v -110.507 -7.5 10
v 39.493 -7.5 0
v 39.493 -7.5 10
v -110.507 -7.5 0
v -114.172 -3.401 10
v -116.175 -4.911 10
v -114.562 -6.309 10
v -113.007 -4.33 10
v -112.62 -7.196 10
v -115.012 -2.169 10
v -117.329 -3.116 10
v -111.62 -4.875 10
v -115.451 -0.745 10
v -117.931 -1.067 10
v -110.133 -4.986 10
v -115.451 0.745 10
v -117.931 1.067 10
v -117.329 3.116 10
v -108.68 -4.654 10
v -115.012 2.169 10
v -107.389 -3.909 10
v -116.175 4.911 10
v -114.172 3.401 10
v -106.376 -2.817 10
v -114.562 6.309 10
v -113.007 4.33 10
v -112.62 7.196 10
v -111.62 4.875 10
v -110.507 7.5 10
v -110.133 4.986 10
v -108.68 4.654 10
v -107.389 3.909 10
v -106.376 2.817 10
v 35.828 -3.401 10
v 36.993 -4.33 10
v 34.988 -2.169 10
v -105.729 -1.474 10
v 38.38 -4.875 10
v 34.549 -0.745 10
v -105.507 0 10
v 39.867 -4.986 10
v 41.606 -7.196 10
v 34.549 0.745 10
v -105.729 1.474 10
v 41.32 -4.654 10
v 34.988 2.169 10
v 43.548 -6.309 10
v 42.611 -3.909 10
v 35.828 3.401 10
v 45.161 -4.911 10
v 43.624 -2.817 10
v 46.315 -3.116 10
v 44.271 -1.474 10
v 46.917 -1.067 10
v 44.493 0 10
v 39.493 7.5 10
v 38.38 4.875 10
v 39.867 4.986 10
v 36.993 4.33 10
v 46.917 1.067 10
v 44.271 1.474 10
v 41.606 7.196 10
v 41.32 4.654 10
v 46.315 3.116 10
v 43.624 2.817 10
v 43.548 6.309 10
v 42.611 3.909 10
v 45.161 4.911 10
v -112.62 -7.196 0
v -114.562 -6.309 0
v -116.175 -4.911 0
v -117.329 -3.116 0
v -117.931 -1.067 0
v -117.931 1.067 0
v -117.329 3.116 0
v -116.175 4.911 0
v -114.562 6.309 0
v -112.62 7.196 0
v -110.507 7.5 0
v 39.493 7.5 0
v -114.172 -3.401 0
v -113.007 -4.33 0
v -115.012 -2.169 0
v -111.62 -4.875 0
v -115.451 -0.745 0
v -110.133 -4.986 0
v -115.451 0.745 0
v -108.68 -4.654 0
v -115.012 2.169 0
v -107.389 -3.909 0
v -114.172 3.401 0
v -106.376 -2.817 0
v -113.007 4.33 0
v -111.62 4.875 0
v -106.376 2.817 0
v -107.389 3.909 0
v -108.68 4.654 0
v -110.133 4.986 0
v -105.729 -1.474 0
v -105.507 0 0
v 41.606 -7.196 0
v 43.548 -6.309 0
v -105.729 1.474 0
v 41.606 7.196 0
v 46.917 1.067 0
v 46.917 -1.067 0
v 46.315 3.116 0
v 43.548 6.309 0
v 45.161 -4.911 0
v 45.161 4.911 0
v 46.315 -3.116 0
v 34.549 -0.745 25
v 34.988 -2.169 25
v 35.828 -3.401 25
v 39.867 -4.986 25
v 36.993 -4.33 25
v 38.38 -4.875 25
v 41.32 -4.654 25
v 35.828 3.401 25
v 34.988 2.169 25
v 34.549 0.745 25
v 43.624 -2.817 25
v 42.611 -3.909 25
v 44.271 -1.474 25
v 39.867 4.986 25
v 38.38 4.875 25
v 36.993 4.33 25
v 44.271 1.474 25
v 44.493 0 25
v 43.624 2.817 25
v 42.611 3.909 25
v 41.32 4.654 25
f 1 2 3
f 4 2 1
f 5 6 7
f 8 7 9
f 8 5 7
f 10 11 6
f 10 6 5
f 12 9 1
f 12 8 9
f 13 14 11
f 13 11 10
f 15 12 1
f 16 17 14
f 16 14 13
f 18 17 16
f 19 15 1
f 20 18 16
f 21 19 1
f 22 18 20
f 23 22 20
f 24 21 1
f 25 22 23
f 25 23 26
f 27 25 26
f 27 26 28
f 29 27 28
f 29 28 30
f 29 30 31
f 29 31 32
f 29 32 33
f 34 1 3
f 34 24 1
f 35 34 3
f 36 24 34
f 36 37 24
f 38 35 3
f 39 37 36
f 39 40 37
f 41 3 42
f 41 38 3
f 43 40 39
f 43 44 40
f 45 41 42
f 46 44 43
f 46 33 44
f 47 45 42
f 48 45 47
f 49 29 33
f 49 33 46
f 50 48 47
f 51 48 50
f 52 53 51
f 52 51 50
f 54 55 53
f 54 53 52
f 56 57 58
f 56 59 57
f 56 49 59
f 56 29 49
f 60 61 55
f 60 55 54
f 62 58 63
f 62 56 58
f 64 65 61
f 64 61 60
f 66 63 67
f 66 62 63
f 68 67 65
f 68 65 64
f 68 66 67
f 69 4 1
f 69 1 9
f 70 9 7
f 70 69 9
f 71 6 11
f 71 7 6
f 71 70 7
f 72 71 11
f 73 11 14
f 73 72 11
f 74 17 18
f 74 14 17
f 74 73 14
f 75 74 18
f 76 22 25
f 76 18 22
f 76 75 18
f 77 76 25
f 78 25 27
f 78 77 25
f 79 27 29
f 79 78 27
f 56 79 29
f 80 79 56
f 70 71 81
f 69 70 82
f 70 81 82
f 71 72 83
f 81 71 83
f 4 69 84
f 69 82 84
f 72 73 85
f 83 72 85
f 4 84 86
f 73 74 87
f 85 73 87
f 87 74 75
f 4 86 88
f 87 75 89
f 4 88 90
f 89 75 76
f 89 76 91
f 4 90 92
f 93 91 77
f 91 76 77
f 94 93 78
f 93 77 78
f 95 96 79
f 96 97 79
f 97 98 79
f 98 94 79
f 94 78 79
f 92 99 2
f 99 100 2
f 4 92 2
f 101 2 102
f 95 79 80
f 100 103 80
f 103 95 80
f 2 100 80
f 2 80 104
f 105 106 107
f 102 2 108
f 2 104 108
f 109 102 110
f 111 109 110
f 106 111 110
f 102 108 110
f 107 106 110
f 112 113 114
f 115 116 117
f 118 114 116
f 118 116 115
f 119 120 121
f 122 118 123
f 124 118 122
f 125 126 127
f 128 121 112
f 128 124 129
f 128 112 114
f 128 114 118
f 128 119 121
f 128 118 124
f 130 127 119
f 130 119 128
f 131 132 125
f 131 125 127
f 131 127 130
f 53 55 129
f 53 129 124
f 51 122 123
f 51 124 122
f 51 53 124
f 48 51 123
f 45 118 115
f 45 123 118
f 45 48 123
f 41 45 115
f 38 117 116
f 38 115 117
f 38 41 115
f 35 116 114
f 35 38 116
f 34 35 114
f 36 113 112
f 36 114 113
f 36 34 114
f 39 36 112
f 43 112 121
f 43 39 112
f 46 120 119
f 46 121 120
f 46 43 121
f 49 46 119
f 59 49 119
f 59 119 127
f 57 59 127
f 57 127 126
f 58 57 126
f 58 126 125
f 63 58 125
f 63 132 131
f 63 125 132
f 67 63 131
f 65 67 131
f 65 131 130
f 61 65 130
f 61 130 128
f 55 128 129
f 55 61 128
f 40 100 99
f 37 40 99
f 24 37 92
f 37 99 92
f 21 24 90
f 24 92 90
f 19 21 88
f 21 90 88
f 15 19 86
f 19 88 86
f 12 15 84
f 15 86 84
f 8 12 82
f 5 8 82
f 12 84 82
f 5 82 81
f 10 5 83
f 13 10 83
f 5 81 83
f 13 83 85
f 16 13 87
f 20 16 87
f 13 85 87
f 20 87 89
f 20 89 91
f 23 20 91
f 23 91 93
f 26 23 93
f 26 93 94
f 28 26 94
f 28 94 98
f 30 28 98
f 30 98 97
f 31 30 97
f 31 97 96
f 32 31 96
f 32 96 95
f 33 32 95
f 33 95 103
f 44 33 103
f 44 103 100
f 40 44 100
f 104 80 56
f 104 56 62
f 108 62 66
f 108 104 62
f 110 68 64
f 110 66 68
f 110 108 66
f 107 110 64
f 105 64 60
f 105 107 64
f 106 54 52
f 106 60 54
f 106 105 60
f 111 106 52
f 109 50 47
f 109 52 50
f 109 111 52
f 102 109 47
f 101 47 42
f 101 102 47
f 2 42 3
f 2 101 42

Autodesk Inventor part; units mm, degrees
ref_plane "YZ Plane" through (0, 0, 0) normal (1, 0, 0) x (0, 1, 0)
ref_plane "XZ Plane" through (0, 0, 0) normal (0, 1, 0) x (-1, 0, 0)
ref_plane "XY Plane" through (0, 0, 0) normal (0, 0, 1) x (1, 0, 0)
sketch "Sketch1" plane through (0, 0, 0) normal (0, 0, 1) x (1, 0, 0)
  line L0 (-110.5069, 7.5) -> (39.4931, 7.5)
  line L1 (39.4931, 7.5) -> (39.4931, -7.5)
  line L2 (39.4931, -7.5) -> (-110.5069, -7.5)
  line L3 (-110.5069, -7.5) -> (-110.5069, 7.5)
  arc A0 (-110.5069, 7.5) -> (-110.5069, -7.5) centre (-110.5069, 0) ccw
  arc A1 (39.4931, -7.5) -> (39.4931, 7.5) centre (39.4931, 0) ccw
  circle A2 centre (-110.5069, 0) radius 5
  point P0 (0, 0)
  dimension "d0" = 150
  dimension "d1" = 15
  dimension "d2" = 7.5
  dimension "d3" = 10
extrude "Extrusion1" add sketch "Sketch1" along normal blind 10 contours L0 L1 L2 L3 A2 | L3 A2 A0 | A1 L1
sketch "Sketch2" plane through (0, 0, 10) normal (0, 0, 1) x (1, 0, 0)
  arc A0 (39.4931, -7.5) -> (39.4931, 7.5) centre (39.4931, 0) ccw projected
  circle A1 centre (39.4931, 0) radius 5
  point P0 (0, 0)
  dimension "d6" = 10
extrude "Extrusion2" add sketch "Sketch2" along normal blind 15
properties part number "innerLink" material "Stainless Steel"
